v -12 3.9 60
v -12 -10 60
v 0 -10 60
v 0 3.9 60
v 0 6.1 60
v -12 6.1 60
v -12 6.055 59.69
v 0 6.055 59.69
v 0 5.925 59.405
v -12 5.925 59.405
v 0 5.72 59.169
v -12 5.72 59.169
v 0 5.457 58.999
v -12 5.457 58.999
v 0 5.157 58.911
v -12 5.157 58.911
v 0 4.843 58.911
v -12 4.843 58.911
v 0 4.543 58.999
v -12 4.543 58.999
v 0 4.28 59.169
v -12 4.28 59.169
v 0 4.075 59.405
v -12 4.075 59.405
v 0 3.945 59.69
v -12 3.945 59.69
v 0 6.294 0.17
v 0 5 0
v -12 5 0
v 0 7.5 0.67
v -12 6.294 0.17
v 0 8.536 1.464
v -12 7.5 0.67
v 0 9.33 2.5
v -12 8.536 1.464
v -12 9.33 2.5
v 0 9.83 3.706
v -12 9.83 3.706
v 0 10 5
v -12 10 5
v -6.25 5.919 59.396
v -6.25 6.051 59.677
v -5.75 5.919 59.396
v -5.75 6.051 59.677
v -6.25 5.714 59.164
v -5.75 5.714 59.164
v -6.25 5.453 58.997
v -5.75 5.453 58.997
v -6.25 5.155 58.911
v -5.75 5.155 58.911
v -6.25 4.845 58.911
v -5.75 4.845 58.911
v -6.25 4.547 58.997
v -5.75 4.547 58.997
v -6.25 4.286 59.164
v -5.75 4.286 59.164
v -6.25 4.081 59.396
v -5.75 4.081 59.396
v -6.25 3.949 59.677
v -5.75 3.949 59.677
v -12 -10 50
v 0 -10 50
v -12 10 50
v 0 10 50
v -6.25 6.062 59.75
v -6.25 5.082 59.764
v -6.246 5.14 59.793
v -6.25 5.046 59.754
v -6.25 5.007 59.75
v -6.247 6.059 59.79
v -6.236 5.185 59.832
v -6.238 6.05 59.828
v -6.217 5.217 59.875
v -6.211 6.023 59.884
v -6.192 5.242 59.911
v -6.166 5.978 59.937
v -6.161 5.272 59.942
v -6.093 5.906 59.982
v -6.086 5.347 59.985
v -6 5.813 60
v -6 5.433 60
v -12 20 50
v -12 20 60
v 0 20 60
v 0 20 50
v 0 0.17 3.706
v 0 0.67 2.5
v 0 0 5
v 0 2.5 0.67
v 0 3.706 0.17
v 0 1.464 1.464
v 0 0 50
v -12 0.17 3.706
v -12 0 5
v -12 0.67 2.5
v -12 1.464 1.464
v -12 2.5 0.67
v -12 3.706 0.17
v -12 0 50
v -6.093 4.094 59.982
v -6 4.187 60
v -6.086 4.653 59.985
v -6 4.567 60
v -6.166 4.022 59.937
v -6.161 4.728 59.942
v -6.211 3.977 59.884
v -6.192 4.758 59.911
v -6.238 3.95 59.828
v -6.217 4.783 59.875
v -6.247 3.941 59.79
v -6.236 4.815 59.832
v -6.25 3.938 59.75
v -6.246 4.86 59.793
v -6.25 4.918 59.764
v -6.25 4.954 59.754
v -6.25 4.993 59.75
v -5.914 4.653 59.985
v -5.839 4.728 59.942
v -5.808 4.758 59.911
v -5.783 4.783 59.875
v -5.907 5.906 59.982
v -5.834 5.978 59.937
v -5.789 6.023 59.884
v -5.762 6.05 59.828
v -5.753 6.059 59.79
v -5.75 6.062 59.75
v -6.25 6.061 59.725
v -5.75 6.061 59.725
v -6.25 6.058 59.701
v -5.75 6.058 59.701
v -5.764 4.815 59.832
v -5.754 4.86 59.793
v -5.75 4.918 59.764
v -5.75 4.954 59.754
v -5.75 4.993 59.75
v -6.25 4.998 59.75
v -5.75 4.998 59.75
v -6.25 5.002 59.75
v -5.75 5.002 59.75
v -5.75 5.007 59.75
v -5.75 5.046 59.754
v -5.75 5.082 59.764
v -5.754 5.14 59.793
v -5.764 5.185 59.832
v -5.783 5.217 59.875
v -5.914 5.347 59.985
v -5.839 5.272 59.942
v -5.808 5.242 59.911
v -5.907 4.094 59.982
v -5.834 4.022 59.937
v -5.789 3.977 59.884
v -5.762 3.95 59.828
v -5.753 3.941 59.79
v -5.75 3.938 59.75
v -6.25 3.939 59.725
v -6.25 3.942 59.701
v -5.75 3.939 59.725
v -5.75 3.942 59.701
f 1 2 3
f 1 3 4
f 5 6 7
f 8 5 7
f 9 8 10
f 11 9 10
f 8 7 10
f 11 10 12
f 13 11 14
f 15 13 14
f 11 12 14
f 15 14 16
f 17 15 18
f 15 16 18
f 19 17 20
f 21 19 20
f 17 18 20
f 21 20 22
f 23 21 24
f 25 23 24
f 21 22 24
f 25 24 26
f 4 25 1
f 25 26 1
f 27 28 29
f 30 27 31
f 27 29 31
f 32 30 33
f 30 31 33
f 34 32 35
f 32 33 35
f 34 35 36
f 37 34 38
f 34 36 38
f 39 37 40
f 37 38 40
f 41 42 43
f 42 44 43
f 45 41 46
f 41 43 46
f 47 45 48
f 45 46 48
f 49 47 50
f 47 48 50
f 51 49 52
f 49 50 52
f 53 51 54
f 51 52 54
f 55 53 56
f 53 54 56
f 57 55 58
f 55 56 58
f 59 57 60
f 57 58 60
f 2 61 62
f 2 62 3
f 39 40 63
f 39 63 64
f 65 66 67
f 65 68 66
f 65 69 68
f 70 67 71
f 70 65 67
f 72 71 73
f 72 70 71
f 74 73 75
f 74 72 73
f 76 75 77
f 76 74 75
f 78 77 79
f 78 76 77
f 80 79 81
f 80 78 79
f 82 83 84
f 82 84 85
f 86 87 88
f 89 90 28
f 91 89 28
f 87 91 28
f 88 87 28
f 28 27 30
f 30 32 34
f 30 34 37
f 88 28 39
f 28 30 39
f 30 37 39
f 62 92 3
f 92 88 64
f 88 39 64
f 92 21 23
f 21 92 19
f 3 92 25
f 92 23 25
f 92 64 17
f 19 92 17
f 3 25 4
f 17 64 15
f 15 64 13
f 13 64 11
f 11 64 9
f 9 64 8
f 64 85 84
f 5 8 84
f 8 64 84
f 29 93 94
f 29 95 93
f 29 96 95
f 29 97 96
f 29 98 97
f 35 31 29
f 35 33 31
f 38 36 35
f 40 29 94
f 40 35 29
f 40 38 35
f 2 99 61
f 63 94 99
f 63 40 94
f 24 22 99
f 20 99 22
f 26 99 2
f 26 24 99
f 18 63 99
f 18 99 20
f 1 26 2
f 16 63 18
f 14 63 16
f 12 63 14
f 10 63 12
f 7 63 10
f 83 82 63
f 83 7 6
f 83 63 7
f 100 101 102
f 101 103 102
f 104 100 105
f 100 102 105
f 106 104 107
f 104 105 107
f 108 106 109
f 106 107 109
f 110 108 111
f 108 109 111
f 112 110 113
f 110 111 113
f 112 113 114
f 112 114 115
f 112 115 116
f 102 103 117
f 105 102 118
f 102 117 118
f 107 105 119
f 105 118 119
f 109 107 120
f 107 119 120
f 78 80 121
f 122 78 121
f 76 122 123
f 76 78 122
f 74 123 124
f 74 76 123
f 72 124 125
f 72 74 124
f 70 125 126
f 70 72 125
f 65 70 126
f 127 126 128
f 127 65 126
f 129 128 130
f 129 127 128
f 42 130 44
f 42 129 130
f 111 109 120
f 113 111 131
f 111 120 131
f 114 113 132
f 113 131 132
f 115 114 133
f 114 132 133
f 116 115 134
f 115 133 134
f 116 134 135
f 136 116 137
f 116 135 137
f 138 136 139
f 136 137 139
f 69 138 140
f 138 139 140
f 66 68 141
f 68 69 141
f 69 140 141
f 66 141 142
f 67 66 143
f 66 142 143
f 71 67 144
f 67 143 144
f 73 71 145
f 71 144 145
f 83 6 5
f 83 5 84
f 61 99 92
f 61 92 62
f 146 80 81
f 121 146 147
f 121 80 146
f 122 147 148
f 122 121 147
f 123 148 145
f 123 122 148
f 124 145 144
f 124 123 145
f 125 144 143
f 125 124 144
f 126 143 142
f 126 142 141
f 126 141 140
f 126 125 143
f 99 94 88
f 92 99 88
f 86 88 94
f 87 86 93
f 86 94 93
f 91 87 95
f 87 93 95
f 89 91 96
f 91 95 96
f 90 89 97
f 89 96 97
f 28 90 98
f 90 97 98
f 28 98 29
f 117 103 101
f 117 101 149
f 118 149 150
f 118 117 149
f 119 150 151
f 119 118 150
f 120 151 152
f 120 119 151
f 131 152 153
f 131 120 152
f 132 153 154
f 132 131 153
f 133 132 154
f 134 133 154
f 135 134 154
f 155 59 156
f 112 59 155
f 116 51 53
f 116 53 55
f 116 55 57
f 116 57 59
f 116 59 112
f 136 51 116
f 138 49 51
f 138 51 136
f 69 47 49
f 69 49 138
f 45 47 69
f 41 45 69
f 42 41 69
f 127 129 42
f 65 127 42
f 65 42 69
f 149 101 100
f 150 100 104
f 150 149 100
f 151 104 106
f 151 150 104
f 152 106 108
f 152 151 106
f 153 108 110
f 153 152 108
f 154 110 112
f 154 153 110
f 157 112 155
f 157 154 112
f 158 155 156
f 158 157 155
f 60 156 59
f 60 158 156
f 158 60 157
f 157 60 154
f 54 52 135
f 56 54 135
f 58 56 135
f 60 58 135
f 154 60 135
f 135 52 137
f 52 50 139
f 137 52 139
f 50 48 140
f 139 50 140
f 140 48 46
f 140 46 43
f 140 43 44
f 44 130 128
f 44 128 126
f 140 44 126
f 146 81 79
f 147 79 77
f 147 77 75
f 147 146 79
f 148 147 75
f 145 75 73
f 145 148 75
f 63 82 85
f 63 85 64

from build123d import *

# Parameters (mm, degrees)
SKETCH_1_W          = 12
SKETCH_1_H          = 10
EXTRUDE_1_DEPTH     = 60
CUT_EXTRUDE_3_DEPTH = 60
EXTRUDE_2_DEPTH     = 12
SKETCH_4_R          = 1.1
CUT_EXTRUDE_4_DEPTH = 12
EXTRUDE_3_DEPTH     = 0.25
SKETCH_6_R          = 0.25
CUT_EXTRUDE_5_DEPTH = 1.5
FILLET_1_R          = 0.25


with BuildPart() as part:
    # 草图1 → 凸台-拉伸1 (new body)
    with BuildSketch(Plane.XY):
        with Locations((-6, 5)):
            Rectangle(SKETCH_1_W, SKETCH_1_H)
    extrude(amount=EXTRUDE_1_DEPTH)

    # 草图2 → 切除-拉伸3 (cut)
    with BuildSketch(Plane.ZY.offset(12)):
        with BuildLine():
            ThreePointArc((0, 5), (1.464466094, 8.535533906), (5, 10))
            Line((5, 10), (0, 10))
            Line((0, 10), (0, 5))
        make_face()
        with BuildLine():
            ThreePointArc((5, 0), (1.464466094, 1.464466094), (0, 5))
            Line((0, 5), (0, 0))
            Line((0, 0), (5, 0))
        make_face()
    extrude(amount=-CUT_EXTRUDE_3_DEPTH, mode=Mode.SUBTRACT)

    # 草图3 → 凸台-拉伸2 (add)
    with BuildSketch(Plane.ZY.offset(12)):
        Polygon((60, 5), (60, 20), (50, 20), (50, -10), (60, -10), align=None)
    extrude(amount=-EXTRUDE_2_DEPTH)

    # 草图4 → 切除-拉伸4 (cut)
    with BuildSketch(Plane.ZY.offset(12)):
        with Locations((60, 5)):
            Circle(SKETCH_4_R)
    extrude(amount=-CUT_EXTRUDE_4_DEPTH, mode=Mode.SUBTRACT)


with BuildPart() as body_2:
    # 草图5 → 凸台-拉伸3 (new, symmetric)
    with BuildSketch(Plane(origin=(-6, 0, 0), x_dir=(0, 0, -1), z_dir=(1, 0, 0))):
        with BuildLine():
            Line((-60, 3.9), (-60, 4.75))
            Line((-60, 4.75), (-60, 5.25))
            Line((-60, 5.25), (-60, 6.1))
            ThreePointArc((-60, 6.1), (-58.9, 5), (-60, 3.9))
        make_face()
    extrude(amount=EXTRUDE_3_DEPTH, both=True)

    # 草图6 → 切除-拉伸5 (cut, symmetric)
    with BuildSketch(Plane(origin=(-6, 0, 0), x_dir=(0, 0, -1), z_dir=(1, 0, 0))):
        with Locations((-60, 5)):
            Circle(SKETCH_6_R)
    extrude(amount=CUT_EXTRUDE_5_DEPTH, both=True, mode=Mode.SUBTRACT)

    # 圆角1
    fillet_1_edges = [body_2.edges().sort_by_distance(p)[0] for p in [
        (-6.25, 4.325, 60),
        (-6.25, 5.675, 60),
        (-6, 6.1, 60),
        (-6, 3.9, 60),
        (-5.75, 4.325, 60),
        (-5.75, 5.675, 60),
        (-6, 5.25, 60),
        (-6, 4.75, 60),
    ]]
    fillet(fillet_1_edges, radius=FILLET_1_R - 0.0001)  # a hair under: the kernel refuses the full size


solid = Compound([part.part, body_2.part])
